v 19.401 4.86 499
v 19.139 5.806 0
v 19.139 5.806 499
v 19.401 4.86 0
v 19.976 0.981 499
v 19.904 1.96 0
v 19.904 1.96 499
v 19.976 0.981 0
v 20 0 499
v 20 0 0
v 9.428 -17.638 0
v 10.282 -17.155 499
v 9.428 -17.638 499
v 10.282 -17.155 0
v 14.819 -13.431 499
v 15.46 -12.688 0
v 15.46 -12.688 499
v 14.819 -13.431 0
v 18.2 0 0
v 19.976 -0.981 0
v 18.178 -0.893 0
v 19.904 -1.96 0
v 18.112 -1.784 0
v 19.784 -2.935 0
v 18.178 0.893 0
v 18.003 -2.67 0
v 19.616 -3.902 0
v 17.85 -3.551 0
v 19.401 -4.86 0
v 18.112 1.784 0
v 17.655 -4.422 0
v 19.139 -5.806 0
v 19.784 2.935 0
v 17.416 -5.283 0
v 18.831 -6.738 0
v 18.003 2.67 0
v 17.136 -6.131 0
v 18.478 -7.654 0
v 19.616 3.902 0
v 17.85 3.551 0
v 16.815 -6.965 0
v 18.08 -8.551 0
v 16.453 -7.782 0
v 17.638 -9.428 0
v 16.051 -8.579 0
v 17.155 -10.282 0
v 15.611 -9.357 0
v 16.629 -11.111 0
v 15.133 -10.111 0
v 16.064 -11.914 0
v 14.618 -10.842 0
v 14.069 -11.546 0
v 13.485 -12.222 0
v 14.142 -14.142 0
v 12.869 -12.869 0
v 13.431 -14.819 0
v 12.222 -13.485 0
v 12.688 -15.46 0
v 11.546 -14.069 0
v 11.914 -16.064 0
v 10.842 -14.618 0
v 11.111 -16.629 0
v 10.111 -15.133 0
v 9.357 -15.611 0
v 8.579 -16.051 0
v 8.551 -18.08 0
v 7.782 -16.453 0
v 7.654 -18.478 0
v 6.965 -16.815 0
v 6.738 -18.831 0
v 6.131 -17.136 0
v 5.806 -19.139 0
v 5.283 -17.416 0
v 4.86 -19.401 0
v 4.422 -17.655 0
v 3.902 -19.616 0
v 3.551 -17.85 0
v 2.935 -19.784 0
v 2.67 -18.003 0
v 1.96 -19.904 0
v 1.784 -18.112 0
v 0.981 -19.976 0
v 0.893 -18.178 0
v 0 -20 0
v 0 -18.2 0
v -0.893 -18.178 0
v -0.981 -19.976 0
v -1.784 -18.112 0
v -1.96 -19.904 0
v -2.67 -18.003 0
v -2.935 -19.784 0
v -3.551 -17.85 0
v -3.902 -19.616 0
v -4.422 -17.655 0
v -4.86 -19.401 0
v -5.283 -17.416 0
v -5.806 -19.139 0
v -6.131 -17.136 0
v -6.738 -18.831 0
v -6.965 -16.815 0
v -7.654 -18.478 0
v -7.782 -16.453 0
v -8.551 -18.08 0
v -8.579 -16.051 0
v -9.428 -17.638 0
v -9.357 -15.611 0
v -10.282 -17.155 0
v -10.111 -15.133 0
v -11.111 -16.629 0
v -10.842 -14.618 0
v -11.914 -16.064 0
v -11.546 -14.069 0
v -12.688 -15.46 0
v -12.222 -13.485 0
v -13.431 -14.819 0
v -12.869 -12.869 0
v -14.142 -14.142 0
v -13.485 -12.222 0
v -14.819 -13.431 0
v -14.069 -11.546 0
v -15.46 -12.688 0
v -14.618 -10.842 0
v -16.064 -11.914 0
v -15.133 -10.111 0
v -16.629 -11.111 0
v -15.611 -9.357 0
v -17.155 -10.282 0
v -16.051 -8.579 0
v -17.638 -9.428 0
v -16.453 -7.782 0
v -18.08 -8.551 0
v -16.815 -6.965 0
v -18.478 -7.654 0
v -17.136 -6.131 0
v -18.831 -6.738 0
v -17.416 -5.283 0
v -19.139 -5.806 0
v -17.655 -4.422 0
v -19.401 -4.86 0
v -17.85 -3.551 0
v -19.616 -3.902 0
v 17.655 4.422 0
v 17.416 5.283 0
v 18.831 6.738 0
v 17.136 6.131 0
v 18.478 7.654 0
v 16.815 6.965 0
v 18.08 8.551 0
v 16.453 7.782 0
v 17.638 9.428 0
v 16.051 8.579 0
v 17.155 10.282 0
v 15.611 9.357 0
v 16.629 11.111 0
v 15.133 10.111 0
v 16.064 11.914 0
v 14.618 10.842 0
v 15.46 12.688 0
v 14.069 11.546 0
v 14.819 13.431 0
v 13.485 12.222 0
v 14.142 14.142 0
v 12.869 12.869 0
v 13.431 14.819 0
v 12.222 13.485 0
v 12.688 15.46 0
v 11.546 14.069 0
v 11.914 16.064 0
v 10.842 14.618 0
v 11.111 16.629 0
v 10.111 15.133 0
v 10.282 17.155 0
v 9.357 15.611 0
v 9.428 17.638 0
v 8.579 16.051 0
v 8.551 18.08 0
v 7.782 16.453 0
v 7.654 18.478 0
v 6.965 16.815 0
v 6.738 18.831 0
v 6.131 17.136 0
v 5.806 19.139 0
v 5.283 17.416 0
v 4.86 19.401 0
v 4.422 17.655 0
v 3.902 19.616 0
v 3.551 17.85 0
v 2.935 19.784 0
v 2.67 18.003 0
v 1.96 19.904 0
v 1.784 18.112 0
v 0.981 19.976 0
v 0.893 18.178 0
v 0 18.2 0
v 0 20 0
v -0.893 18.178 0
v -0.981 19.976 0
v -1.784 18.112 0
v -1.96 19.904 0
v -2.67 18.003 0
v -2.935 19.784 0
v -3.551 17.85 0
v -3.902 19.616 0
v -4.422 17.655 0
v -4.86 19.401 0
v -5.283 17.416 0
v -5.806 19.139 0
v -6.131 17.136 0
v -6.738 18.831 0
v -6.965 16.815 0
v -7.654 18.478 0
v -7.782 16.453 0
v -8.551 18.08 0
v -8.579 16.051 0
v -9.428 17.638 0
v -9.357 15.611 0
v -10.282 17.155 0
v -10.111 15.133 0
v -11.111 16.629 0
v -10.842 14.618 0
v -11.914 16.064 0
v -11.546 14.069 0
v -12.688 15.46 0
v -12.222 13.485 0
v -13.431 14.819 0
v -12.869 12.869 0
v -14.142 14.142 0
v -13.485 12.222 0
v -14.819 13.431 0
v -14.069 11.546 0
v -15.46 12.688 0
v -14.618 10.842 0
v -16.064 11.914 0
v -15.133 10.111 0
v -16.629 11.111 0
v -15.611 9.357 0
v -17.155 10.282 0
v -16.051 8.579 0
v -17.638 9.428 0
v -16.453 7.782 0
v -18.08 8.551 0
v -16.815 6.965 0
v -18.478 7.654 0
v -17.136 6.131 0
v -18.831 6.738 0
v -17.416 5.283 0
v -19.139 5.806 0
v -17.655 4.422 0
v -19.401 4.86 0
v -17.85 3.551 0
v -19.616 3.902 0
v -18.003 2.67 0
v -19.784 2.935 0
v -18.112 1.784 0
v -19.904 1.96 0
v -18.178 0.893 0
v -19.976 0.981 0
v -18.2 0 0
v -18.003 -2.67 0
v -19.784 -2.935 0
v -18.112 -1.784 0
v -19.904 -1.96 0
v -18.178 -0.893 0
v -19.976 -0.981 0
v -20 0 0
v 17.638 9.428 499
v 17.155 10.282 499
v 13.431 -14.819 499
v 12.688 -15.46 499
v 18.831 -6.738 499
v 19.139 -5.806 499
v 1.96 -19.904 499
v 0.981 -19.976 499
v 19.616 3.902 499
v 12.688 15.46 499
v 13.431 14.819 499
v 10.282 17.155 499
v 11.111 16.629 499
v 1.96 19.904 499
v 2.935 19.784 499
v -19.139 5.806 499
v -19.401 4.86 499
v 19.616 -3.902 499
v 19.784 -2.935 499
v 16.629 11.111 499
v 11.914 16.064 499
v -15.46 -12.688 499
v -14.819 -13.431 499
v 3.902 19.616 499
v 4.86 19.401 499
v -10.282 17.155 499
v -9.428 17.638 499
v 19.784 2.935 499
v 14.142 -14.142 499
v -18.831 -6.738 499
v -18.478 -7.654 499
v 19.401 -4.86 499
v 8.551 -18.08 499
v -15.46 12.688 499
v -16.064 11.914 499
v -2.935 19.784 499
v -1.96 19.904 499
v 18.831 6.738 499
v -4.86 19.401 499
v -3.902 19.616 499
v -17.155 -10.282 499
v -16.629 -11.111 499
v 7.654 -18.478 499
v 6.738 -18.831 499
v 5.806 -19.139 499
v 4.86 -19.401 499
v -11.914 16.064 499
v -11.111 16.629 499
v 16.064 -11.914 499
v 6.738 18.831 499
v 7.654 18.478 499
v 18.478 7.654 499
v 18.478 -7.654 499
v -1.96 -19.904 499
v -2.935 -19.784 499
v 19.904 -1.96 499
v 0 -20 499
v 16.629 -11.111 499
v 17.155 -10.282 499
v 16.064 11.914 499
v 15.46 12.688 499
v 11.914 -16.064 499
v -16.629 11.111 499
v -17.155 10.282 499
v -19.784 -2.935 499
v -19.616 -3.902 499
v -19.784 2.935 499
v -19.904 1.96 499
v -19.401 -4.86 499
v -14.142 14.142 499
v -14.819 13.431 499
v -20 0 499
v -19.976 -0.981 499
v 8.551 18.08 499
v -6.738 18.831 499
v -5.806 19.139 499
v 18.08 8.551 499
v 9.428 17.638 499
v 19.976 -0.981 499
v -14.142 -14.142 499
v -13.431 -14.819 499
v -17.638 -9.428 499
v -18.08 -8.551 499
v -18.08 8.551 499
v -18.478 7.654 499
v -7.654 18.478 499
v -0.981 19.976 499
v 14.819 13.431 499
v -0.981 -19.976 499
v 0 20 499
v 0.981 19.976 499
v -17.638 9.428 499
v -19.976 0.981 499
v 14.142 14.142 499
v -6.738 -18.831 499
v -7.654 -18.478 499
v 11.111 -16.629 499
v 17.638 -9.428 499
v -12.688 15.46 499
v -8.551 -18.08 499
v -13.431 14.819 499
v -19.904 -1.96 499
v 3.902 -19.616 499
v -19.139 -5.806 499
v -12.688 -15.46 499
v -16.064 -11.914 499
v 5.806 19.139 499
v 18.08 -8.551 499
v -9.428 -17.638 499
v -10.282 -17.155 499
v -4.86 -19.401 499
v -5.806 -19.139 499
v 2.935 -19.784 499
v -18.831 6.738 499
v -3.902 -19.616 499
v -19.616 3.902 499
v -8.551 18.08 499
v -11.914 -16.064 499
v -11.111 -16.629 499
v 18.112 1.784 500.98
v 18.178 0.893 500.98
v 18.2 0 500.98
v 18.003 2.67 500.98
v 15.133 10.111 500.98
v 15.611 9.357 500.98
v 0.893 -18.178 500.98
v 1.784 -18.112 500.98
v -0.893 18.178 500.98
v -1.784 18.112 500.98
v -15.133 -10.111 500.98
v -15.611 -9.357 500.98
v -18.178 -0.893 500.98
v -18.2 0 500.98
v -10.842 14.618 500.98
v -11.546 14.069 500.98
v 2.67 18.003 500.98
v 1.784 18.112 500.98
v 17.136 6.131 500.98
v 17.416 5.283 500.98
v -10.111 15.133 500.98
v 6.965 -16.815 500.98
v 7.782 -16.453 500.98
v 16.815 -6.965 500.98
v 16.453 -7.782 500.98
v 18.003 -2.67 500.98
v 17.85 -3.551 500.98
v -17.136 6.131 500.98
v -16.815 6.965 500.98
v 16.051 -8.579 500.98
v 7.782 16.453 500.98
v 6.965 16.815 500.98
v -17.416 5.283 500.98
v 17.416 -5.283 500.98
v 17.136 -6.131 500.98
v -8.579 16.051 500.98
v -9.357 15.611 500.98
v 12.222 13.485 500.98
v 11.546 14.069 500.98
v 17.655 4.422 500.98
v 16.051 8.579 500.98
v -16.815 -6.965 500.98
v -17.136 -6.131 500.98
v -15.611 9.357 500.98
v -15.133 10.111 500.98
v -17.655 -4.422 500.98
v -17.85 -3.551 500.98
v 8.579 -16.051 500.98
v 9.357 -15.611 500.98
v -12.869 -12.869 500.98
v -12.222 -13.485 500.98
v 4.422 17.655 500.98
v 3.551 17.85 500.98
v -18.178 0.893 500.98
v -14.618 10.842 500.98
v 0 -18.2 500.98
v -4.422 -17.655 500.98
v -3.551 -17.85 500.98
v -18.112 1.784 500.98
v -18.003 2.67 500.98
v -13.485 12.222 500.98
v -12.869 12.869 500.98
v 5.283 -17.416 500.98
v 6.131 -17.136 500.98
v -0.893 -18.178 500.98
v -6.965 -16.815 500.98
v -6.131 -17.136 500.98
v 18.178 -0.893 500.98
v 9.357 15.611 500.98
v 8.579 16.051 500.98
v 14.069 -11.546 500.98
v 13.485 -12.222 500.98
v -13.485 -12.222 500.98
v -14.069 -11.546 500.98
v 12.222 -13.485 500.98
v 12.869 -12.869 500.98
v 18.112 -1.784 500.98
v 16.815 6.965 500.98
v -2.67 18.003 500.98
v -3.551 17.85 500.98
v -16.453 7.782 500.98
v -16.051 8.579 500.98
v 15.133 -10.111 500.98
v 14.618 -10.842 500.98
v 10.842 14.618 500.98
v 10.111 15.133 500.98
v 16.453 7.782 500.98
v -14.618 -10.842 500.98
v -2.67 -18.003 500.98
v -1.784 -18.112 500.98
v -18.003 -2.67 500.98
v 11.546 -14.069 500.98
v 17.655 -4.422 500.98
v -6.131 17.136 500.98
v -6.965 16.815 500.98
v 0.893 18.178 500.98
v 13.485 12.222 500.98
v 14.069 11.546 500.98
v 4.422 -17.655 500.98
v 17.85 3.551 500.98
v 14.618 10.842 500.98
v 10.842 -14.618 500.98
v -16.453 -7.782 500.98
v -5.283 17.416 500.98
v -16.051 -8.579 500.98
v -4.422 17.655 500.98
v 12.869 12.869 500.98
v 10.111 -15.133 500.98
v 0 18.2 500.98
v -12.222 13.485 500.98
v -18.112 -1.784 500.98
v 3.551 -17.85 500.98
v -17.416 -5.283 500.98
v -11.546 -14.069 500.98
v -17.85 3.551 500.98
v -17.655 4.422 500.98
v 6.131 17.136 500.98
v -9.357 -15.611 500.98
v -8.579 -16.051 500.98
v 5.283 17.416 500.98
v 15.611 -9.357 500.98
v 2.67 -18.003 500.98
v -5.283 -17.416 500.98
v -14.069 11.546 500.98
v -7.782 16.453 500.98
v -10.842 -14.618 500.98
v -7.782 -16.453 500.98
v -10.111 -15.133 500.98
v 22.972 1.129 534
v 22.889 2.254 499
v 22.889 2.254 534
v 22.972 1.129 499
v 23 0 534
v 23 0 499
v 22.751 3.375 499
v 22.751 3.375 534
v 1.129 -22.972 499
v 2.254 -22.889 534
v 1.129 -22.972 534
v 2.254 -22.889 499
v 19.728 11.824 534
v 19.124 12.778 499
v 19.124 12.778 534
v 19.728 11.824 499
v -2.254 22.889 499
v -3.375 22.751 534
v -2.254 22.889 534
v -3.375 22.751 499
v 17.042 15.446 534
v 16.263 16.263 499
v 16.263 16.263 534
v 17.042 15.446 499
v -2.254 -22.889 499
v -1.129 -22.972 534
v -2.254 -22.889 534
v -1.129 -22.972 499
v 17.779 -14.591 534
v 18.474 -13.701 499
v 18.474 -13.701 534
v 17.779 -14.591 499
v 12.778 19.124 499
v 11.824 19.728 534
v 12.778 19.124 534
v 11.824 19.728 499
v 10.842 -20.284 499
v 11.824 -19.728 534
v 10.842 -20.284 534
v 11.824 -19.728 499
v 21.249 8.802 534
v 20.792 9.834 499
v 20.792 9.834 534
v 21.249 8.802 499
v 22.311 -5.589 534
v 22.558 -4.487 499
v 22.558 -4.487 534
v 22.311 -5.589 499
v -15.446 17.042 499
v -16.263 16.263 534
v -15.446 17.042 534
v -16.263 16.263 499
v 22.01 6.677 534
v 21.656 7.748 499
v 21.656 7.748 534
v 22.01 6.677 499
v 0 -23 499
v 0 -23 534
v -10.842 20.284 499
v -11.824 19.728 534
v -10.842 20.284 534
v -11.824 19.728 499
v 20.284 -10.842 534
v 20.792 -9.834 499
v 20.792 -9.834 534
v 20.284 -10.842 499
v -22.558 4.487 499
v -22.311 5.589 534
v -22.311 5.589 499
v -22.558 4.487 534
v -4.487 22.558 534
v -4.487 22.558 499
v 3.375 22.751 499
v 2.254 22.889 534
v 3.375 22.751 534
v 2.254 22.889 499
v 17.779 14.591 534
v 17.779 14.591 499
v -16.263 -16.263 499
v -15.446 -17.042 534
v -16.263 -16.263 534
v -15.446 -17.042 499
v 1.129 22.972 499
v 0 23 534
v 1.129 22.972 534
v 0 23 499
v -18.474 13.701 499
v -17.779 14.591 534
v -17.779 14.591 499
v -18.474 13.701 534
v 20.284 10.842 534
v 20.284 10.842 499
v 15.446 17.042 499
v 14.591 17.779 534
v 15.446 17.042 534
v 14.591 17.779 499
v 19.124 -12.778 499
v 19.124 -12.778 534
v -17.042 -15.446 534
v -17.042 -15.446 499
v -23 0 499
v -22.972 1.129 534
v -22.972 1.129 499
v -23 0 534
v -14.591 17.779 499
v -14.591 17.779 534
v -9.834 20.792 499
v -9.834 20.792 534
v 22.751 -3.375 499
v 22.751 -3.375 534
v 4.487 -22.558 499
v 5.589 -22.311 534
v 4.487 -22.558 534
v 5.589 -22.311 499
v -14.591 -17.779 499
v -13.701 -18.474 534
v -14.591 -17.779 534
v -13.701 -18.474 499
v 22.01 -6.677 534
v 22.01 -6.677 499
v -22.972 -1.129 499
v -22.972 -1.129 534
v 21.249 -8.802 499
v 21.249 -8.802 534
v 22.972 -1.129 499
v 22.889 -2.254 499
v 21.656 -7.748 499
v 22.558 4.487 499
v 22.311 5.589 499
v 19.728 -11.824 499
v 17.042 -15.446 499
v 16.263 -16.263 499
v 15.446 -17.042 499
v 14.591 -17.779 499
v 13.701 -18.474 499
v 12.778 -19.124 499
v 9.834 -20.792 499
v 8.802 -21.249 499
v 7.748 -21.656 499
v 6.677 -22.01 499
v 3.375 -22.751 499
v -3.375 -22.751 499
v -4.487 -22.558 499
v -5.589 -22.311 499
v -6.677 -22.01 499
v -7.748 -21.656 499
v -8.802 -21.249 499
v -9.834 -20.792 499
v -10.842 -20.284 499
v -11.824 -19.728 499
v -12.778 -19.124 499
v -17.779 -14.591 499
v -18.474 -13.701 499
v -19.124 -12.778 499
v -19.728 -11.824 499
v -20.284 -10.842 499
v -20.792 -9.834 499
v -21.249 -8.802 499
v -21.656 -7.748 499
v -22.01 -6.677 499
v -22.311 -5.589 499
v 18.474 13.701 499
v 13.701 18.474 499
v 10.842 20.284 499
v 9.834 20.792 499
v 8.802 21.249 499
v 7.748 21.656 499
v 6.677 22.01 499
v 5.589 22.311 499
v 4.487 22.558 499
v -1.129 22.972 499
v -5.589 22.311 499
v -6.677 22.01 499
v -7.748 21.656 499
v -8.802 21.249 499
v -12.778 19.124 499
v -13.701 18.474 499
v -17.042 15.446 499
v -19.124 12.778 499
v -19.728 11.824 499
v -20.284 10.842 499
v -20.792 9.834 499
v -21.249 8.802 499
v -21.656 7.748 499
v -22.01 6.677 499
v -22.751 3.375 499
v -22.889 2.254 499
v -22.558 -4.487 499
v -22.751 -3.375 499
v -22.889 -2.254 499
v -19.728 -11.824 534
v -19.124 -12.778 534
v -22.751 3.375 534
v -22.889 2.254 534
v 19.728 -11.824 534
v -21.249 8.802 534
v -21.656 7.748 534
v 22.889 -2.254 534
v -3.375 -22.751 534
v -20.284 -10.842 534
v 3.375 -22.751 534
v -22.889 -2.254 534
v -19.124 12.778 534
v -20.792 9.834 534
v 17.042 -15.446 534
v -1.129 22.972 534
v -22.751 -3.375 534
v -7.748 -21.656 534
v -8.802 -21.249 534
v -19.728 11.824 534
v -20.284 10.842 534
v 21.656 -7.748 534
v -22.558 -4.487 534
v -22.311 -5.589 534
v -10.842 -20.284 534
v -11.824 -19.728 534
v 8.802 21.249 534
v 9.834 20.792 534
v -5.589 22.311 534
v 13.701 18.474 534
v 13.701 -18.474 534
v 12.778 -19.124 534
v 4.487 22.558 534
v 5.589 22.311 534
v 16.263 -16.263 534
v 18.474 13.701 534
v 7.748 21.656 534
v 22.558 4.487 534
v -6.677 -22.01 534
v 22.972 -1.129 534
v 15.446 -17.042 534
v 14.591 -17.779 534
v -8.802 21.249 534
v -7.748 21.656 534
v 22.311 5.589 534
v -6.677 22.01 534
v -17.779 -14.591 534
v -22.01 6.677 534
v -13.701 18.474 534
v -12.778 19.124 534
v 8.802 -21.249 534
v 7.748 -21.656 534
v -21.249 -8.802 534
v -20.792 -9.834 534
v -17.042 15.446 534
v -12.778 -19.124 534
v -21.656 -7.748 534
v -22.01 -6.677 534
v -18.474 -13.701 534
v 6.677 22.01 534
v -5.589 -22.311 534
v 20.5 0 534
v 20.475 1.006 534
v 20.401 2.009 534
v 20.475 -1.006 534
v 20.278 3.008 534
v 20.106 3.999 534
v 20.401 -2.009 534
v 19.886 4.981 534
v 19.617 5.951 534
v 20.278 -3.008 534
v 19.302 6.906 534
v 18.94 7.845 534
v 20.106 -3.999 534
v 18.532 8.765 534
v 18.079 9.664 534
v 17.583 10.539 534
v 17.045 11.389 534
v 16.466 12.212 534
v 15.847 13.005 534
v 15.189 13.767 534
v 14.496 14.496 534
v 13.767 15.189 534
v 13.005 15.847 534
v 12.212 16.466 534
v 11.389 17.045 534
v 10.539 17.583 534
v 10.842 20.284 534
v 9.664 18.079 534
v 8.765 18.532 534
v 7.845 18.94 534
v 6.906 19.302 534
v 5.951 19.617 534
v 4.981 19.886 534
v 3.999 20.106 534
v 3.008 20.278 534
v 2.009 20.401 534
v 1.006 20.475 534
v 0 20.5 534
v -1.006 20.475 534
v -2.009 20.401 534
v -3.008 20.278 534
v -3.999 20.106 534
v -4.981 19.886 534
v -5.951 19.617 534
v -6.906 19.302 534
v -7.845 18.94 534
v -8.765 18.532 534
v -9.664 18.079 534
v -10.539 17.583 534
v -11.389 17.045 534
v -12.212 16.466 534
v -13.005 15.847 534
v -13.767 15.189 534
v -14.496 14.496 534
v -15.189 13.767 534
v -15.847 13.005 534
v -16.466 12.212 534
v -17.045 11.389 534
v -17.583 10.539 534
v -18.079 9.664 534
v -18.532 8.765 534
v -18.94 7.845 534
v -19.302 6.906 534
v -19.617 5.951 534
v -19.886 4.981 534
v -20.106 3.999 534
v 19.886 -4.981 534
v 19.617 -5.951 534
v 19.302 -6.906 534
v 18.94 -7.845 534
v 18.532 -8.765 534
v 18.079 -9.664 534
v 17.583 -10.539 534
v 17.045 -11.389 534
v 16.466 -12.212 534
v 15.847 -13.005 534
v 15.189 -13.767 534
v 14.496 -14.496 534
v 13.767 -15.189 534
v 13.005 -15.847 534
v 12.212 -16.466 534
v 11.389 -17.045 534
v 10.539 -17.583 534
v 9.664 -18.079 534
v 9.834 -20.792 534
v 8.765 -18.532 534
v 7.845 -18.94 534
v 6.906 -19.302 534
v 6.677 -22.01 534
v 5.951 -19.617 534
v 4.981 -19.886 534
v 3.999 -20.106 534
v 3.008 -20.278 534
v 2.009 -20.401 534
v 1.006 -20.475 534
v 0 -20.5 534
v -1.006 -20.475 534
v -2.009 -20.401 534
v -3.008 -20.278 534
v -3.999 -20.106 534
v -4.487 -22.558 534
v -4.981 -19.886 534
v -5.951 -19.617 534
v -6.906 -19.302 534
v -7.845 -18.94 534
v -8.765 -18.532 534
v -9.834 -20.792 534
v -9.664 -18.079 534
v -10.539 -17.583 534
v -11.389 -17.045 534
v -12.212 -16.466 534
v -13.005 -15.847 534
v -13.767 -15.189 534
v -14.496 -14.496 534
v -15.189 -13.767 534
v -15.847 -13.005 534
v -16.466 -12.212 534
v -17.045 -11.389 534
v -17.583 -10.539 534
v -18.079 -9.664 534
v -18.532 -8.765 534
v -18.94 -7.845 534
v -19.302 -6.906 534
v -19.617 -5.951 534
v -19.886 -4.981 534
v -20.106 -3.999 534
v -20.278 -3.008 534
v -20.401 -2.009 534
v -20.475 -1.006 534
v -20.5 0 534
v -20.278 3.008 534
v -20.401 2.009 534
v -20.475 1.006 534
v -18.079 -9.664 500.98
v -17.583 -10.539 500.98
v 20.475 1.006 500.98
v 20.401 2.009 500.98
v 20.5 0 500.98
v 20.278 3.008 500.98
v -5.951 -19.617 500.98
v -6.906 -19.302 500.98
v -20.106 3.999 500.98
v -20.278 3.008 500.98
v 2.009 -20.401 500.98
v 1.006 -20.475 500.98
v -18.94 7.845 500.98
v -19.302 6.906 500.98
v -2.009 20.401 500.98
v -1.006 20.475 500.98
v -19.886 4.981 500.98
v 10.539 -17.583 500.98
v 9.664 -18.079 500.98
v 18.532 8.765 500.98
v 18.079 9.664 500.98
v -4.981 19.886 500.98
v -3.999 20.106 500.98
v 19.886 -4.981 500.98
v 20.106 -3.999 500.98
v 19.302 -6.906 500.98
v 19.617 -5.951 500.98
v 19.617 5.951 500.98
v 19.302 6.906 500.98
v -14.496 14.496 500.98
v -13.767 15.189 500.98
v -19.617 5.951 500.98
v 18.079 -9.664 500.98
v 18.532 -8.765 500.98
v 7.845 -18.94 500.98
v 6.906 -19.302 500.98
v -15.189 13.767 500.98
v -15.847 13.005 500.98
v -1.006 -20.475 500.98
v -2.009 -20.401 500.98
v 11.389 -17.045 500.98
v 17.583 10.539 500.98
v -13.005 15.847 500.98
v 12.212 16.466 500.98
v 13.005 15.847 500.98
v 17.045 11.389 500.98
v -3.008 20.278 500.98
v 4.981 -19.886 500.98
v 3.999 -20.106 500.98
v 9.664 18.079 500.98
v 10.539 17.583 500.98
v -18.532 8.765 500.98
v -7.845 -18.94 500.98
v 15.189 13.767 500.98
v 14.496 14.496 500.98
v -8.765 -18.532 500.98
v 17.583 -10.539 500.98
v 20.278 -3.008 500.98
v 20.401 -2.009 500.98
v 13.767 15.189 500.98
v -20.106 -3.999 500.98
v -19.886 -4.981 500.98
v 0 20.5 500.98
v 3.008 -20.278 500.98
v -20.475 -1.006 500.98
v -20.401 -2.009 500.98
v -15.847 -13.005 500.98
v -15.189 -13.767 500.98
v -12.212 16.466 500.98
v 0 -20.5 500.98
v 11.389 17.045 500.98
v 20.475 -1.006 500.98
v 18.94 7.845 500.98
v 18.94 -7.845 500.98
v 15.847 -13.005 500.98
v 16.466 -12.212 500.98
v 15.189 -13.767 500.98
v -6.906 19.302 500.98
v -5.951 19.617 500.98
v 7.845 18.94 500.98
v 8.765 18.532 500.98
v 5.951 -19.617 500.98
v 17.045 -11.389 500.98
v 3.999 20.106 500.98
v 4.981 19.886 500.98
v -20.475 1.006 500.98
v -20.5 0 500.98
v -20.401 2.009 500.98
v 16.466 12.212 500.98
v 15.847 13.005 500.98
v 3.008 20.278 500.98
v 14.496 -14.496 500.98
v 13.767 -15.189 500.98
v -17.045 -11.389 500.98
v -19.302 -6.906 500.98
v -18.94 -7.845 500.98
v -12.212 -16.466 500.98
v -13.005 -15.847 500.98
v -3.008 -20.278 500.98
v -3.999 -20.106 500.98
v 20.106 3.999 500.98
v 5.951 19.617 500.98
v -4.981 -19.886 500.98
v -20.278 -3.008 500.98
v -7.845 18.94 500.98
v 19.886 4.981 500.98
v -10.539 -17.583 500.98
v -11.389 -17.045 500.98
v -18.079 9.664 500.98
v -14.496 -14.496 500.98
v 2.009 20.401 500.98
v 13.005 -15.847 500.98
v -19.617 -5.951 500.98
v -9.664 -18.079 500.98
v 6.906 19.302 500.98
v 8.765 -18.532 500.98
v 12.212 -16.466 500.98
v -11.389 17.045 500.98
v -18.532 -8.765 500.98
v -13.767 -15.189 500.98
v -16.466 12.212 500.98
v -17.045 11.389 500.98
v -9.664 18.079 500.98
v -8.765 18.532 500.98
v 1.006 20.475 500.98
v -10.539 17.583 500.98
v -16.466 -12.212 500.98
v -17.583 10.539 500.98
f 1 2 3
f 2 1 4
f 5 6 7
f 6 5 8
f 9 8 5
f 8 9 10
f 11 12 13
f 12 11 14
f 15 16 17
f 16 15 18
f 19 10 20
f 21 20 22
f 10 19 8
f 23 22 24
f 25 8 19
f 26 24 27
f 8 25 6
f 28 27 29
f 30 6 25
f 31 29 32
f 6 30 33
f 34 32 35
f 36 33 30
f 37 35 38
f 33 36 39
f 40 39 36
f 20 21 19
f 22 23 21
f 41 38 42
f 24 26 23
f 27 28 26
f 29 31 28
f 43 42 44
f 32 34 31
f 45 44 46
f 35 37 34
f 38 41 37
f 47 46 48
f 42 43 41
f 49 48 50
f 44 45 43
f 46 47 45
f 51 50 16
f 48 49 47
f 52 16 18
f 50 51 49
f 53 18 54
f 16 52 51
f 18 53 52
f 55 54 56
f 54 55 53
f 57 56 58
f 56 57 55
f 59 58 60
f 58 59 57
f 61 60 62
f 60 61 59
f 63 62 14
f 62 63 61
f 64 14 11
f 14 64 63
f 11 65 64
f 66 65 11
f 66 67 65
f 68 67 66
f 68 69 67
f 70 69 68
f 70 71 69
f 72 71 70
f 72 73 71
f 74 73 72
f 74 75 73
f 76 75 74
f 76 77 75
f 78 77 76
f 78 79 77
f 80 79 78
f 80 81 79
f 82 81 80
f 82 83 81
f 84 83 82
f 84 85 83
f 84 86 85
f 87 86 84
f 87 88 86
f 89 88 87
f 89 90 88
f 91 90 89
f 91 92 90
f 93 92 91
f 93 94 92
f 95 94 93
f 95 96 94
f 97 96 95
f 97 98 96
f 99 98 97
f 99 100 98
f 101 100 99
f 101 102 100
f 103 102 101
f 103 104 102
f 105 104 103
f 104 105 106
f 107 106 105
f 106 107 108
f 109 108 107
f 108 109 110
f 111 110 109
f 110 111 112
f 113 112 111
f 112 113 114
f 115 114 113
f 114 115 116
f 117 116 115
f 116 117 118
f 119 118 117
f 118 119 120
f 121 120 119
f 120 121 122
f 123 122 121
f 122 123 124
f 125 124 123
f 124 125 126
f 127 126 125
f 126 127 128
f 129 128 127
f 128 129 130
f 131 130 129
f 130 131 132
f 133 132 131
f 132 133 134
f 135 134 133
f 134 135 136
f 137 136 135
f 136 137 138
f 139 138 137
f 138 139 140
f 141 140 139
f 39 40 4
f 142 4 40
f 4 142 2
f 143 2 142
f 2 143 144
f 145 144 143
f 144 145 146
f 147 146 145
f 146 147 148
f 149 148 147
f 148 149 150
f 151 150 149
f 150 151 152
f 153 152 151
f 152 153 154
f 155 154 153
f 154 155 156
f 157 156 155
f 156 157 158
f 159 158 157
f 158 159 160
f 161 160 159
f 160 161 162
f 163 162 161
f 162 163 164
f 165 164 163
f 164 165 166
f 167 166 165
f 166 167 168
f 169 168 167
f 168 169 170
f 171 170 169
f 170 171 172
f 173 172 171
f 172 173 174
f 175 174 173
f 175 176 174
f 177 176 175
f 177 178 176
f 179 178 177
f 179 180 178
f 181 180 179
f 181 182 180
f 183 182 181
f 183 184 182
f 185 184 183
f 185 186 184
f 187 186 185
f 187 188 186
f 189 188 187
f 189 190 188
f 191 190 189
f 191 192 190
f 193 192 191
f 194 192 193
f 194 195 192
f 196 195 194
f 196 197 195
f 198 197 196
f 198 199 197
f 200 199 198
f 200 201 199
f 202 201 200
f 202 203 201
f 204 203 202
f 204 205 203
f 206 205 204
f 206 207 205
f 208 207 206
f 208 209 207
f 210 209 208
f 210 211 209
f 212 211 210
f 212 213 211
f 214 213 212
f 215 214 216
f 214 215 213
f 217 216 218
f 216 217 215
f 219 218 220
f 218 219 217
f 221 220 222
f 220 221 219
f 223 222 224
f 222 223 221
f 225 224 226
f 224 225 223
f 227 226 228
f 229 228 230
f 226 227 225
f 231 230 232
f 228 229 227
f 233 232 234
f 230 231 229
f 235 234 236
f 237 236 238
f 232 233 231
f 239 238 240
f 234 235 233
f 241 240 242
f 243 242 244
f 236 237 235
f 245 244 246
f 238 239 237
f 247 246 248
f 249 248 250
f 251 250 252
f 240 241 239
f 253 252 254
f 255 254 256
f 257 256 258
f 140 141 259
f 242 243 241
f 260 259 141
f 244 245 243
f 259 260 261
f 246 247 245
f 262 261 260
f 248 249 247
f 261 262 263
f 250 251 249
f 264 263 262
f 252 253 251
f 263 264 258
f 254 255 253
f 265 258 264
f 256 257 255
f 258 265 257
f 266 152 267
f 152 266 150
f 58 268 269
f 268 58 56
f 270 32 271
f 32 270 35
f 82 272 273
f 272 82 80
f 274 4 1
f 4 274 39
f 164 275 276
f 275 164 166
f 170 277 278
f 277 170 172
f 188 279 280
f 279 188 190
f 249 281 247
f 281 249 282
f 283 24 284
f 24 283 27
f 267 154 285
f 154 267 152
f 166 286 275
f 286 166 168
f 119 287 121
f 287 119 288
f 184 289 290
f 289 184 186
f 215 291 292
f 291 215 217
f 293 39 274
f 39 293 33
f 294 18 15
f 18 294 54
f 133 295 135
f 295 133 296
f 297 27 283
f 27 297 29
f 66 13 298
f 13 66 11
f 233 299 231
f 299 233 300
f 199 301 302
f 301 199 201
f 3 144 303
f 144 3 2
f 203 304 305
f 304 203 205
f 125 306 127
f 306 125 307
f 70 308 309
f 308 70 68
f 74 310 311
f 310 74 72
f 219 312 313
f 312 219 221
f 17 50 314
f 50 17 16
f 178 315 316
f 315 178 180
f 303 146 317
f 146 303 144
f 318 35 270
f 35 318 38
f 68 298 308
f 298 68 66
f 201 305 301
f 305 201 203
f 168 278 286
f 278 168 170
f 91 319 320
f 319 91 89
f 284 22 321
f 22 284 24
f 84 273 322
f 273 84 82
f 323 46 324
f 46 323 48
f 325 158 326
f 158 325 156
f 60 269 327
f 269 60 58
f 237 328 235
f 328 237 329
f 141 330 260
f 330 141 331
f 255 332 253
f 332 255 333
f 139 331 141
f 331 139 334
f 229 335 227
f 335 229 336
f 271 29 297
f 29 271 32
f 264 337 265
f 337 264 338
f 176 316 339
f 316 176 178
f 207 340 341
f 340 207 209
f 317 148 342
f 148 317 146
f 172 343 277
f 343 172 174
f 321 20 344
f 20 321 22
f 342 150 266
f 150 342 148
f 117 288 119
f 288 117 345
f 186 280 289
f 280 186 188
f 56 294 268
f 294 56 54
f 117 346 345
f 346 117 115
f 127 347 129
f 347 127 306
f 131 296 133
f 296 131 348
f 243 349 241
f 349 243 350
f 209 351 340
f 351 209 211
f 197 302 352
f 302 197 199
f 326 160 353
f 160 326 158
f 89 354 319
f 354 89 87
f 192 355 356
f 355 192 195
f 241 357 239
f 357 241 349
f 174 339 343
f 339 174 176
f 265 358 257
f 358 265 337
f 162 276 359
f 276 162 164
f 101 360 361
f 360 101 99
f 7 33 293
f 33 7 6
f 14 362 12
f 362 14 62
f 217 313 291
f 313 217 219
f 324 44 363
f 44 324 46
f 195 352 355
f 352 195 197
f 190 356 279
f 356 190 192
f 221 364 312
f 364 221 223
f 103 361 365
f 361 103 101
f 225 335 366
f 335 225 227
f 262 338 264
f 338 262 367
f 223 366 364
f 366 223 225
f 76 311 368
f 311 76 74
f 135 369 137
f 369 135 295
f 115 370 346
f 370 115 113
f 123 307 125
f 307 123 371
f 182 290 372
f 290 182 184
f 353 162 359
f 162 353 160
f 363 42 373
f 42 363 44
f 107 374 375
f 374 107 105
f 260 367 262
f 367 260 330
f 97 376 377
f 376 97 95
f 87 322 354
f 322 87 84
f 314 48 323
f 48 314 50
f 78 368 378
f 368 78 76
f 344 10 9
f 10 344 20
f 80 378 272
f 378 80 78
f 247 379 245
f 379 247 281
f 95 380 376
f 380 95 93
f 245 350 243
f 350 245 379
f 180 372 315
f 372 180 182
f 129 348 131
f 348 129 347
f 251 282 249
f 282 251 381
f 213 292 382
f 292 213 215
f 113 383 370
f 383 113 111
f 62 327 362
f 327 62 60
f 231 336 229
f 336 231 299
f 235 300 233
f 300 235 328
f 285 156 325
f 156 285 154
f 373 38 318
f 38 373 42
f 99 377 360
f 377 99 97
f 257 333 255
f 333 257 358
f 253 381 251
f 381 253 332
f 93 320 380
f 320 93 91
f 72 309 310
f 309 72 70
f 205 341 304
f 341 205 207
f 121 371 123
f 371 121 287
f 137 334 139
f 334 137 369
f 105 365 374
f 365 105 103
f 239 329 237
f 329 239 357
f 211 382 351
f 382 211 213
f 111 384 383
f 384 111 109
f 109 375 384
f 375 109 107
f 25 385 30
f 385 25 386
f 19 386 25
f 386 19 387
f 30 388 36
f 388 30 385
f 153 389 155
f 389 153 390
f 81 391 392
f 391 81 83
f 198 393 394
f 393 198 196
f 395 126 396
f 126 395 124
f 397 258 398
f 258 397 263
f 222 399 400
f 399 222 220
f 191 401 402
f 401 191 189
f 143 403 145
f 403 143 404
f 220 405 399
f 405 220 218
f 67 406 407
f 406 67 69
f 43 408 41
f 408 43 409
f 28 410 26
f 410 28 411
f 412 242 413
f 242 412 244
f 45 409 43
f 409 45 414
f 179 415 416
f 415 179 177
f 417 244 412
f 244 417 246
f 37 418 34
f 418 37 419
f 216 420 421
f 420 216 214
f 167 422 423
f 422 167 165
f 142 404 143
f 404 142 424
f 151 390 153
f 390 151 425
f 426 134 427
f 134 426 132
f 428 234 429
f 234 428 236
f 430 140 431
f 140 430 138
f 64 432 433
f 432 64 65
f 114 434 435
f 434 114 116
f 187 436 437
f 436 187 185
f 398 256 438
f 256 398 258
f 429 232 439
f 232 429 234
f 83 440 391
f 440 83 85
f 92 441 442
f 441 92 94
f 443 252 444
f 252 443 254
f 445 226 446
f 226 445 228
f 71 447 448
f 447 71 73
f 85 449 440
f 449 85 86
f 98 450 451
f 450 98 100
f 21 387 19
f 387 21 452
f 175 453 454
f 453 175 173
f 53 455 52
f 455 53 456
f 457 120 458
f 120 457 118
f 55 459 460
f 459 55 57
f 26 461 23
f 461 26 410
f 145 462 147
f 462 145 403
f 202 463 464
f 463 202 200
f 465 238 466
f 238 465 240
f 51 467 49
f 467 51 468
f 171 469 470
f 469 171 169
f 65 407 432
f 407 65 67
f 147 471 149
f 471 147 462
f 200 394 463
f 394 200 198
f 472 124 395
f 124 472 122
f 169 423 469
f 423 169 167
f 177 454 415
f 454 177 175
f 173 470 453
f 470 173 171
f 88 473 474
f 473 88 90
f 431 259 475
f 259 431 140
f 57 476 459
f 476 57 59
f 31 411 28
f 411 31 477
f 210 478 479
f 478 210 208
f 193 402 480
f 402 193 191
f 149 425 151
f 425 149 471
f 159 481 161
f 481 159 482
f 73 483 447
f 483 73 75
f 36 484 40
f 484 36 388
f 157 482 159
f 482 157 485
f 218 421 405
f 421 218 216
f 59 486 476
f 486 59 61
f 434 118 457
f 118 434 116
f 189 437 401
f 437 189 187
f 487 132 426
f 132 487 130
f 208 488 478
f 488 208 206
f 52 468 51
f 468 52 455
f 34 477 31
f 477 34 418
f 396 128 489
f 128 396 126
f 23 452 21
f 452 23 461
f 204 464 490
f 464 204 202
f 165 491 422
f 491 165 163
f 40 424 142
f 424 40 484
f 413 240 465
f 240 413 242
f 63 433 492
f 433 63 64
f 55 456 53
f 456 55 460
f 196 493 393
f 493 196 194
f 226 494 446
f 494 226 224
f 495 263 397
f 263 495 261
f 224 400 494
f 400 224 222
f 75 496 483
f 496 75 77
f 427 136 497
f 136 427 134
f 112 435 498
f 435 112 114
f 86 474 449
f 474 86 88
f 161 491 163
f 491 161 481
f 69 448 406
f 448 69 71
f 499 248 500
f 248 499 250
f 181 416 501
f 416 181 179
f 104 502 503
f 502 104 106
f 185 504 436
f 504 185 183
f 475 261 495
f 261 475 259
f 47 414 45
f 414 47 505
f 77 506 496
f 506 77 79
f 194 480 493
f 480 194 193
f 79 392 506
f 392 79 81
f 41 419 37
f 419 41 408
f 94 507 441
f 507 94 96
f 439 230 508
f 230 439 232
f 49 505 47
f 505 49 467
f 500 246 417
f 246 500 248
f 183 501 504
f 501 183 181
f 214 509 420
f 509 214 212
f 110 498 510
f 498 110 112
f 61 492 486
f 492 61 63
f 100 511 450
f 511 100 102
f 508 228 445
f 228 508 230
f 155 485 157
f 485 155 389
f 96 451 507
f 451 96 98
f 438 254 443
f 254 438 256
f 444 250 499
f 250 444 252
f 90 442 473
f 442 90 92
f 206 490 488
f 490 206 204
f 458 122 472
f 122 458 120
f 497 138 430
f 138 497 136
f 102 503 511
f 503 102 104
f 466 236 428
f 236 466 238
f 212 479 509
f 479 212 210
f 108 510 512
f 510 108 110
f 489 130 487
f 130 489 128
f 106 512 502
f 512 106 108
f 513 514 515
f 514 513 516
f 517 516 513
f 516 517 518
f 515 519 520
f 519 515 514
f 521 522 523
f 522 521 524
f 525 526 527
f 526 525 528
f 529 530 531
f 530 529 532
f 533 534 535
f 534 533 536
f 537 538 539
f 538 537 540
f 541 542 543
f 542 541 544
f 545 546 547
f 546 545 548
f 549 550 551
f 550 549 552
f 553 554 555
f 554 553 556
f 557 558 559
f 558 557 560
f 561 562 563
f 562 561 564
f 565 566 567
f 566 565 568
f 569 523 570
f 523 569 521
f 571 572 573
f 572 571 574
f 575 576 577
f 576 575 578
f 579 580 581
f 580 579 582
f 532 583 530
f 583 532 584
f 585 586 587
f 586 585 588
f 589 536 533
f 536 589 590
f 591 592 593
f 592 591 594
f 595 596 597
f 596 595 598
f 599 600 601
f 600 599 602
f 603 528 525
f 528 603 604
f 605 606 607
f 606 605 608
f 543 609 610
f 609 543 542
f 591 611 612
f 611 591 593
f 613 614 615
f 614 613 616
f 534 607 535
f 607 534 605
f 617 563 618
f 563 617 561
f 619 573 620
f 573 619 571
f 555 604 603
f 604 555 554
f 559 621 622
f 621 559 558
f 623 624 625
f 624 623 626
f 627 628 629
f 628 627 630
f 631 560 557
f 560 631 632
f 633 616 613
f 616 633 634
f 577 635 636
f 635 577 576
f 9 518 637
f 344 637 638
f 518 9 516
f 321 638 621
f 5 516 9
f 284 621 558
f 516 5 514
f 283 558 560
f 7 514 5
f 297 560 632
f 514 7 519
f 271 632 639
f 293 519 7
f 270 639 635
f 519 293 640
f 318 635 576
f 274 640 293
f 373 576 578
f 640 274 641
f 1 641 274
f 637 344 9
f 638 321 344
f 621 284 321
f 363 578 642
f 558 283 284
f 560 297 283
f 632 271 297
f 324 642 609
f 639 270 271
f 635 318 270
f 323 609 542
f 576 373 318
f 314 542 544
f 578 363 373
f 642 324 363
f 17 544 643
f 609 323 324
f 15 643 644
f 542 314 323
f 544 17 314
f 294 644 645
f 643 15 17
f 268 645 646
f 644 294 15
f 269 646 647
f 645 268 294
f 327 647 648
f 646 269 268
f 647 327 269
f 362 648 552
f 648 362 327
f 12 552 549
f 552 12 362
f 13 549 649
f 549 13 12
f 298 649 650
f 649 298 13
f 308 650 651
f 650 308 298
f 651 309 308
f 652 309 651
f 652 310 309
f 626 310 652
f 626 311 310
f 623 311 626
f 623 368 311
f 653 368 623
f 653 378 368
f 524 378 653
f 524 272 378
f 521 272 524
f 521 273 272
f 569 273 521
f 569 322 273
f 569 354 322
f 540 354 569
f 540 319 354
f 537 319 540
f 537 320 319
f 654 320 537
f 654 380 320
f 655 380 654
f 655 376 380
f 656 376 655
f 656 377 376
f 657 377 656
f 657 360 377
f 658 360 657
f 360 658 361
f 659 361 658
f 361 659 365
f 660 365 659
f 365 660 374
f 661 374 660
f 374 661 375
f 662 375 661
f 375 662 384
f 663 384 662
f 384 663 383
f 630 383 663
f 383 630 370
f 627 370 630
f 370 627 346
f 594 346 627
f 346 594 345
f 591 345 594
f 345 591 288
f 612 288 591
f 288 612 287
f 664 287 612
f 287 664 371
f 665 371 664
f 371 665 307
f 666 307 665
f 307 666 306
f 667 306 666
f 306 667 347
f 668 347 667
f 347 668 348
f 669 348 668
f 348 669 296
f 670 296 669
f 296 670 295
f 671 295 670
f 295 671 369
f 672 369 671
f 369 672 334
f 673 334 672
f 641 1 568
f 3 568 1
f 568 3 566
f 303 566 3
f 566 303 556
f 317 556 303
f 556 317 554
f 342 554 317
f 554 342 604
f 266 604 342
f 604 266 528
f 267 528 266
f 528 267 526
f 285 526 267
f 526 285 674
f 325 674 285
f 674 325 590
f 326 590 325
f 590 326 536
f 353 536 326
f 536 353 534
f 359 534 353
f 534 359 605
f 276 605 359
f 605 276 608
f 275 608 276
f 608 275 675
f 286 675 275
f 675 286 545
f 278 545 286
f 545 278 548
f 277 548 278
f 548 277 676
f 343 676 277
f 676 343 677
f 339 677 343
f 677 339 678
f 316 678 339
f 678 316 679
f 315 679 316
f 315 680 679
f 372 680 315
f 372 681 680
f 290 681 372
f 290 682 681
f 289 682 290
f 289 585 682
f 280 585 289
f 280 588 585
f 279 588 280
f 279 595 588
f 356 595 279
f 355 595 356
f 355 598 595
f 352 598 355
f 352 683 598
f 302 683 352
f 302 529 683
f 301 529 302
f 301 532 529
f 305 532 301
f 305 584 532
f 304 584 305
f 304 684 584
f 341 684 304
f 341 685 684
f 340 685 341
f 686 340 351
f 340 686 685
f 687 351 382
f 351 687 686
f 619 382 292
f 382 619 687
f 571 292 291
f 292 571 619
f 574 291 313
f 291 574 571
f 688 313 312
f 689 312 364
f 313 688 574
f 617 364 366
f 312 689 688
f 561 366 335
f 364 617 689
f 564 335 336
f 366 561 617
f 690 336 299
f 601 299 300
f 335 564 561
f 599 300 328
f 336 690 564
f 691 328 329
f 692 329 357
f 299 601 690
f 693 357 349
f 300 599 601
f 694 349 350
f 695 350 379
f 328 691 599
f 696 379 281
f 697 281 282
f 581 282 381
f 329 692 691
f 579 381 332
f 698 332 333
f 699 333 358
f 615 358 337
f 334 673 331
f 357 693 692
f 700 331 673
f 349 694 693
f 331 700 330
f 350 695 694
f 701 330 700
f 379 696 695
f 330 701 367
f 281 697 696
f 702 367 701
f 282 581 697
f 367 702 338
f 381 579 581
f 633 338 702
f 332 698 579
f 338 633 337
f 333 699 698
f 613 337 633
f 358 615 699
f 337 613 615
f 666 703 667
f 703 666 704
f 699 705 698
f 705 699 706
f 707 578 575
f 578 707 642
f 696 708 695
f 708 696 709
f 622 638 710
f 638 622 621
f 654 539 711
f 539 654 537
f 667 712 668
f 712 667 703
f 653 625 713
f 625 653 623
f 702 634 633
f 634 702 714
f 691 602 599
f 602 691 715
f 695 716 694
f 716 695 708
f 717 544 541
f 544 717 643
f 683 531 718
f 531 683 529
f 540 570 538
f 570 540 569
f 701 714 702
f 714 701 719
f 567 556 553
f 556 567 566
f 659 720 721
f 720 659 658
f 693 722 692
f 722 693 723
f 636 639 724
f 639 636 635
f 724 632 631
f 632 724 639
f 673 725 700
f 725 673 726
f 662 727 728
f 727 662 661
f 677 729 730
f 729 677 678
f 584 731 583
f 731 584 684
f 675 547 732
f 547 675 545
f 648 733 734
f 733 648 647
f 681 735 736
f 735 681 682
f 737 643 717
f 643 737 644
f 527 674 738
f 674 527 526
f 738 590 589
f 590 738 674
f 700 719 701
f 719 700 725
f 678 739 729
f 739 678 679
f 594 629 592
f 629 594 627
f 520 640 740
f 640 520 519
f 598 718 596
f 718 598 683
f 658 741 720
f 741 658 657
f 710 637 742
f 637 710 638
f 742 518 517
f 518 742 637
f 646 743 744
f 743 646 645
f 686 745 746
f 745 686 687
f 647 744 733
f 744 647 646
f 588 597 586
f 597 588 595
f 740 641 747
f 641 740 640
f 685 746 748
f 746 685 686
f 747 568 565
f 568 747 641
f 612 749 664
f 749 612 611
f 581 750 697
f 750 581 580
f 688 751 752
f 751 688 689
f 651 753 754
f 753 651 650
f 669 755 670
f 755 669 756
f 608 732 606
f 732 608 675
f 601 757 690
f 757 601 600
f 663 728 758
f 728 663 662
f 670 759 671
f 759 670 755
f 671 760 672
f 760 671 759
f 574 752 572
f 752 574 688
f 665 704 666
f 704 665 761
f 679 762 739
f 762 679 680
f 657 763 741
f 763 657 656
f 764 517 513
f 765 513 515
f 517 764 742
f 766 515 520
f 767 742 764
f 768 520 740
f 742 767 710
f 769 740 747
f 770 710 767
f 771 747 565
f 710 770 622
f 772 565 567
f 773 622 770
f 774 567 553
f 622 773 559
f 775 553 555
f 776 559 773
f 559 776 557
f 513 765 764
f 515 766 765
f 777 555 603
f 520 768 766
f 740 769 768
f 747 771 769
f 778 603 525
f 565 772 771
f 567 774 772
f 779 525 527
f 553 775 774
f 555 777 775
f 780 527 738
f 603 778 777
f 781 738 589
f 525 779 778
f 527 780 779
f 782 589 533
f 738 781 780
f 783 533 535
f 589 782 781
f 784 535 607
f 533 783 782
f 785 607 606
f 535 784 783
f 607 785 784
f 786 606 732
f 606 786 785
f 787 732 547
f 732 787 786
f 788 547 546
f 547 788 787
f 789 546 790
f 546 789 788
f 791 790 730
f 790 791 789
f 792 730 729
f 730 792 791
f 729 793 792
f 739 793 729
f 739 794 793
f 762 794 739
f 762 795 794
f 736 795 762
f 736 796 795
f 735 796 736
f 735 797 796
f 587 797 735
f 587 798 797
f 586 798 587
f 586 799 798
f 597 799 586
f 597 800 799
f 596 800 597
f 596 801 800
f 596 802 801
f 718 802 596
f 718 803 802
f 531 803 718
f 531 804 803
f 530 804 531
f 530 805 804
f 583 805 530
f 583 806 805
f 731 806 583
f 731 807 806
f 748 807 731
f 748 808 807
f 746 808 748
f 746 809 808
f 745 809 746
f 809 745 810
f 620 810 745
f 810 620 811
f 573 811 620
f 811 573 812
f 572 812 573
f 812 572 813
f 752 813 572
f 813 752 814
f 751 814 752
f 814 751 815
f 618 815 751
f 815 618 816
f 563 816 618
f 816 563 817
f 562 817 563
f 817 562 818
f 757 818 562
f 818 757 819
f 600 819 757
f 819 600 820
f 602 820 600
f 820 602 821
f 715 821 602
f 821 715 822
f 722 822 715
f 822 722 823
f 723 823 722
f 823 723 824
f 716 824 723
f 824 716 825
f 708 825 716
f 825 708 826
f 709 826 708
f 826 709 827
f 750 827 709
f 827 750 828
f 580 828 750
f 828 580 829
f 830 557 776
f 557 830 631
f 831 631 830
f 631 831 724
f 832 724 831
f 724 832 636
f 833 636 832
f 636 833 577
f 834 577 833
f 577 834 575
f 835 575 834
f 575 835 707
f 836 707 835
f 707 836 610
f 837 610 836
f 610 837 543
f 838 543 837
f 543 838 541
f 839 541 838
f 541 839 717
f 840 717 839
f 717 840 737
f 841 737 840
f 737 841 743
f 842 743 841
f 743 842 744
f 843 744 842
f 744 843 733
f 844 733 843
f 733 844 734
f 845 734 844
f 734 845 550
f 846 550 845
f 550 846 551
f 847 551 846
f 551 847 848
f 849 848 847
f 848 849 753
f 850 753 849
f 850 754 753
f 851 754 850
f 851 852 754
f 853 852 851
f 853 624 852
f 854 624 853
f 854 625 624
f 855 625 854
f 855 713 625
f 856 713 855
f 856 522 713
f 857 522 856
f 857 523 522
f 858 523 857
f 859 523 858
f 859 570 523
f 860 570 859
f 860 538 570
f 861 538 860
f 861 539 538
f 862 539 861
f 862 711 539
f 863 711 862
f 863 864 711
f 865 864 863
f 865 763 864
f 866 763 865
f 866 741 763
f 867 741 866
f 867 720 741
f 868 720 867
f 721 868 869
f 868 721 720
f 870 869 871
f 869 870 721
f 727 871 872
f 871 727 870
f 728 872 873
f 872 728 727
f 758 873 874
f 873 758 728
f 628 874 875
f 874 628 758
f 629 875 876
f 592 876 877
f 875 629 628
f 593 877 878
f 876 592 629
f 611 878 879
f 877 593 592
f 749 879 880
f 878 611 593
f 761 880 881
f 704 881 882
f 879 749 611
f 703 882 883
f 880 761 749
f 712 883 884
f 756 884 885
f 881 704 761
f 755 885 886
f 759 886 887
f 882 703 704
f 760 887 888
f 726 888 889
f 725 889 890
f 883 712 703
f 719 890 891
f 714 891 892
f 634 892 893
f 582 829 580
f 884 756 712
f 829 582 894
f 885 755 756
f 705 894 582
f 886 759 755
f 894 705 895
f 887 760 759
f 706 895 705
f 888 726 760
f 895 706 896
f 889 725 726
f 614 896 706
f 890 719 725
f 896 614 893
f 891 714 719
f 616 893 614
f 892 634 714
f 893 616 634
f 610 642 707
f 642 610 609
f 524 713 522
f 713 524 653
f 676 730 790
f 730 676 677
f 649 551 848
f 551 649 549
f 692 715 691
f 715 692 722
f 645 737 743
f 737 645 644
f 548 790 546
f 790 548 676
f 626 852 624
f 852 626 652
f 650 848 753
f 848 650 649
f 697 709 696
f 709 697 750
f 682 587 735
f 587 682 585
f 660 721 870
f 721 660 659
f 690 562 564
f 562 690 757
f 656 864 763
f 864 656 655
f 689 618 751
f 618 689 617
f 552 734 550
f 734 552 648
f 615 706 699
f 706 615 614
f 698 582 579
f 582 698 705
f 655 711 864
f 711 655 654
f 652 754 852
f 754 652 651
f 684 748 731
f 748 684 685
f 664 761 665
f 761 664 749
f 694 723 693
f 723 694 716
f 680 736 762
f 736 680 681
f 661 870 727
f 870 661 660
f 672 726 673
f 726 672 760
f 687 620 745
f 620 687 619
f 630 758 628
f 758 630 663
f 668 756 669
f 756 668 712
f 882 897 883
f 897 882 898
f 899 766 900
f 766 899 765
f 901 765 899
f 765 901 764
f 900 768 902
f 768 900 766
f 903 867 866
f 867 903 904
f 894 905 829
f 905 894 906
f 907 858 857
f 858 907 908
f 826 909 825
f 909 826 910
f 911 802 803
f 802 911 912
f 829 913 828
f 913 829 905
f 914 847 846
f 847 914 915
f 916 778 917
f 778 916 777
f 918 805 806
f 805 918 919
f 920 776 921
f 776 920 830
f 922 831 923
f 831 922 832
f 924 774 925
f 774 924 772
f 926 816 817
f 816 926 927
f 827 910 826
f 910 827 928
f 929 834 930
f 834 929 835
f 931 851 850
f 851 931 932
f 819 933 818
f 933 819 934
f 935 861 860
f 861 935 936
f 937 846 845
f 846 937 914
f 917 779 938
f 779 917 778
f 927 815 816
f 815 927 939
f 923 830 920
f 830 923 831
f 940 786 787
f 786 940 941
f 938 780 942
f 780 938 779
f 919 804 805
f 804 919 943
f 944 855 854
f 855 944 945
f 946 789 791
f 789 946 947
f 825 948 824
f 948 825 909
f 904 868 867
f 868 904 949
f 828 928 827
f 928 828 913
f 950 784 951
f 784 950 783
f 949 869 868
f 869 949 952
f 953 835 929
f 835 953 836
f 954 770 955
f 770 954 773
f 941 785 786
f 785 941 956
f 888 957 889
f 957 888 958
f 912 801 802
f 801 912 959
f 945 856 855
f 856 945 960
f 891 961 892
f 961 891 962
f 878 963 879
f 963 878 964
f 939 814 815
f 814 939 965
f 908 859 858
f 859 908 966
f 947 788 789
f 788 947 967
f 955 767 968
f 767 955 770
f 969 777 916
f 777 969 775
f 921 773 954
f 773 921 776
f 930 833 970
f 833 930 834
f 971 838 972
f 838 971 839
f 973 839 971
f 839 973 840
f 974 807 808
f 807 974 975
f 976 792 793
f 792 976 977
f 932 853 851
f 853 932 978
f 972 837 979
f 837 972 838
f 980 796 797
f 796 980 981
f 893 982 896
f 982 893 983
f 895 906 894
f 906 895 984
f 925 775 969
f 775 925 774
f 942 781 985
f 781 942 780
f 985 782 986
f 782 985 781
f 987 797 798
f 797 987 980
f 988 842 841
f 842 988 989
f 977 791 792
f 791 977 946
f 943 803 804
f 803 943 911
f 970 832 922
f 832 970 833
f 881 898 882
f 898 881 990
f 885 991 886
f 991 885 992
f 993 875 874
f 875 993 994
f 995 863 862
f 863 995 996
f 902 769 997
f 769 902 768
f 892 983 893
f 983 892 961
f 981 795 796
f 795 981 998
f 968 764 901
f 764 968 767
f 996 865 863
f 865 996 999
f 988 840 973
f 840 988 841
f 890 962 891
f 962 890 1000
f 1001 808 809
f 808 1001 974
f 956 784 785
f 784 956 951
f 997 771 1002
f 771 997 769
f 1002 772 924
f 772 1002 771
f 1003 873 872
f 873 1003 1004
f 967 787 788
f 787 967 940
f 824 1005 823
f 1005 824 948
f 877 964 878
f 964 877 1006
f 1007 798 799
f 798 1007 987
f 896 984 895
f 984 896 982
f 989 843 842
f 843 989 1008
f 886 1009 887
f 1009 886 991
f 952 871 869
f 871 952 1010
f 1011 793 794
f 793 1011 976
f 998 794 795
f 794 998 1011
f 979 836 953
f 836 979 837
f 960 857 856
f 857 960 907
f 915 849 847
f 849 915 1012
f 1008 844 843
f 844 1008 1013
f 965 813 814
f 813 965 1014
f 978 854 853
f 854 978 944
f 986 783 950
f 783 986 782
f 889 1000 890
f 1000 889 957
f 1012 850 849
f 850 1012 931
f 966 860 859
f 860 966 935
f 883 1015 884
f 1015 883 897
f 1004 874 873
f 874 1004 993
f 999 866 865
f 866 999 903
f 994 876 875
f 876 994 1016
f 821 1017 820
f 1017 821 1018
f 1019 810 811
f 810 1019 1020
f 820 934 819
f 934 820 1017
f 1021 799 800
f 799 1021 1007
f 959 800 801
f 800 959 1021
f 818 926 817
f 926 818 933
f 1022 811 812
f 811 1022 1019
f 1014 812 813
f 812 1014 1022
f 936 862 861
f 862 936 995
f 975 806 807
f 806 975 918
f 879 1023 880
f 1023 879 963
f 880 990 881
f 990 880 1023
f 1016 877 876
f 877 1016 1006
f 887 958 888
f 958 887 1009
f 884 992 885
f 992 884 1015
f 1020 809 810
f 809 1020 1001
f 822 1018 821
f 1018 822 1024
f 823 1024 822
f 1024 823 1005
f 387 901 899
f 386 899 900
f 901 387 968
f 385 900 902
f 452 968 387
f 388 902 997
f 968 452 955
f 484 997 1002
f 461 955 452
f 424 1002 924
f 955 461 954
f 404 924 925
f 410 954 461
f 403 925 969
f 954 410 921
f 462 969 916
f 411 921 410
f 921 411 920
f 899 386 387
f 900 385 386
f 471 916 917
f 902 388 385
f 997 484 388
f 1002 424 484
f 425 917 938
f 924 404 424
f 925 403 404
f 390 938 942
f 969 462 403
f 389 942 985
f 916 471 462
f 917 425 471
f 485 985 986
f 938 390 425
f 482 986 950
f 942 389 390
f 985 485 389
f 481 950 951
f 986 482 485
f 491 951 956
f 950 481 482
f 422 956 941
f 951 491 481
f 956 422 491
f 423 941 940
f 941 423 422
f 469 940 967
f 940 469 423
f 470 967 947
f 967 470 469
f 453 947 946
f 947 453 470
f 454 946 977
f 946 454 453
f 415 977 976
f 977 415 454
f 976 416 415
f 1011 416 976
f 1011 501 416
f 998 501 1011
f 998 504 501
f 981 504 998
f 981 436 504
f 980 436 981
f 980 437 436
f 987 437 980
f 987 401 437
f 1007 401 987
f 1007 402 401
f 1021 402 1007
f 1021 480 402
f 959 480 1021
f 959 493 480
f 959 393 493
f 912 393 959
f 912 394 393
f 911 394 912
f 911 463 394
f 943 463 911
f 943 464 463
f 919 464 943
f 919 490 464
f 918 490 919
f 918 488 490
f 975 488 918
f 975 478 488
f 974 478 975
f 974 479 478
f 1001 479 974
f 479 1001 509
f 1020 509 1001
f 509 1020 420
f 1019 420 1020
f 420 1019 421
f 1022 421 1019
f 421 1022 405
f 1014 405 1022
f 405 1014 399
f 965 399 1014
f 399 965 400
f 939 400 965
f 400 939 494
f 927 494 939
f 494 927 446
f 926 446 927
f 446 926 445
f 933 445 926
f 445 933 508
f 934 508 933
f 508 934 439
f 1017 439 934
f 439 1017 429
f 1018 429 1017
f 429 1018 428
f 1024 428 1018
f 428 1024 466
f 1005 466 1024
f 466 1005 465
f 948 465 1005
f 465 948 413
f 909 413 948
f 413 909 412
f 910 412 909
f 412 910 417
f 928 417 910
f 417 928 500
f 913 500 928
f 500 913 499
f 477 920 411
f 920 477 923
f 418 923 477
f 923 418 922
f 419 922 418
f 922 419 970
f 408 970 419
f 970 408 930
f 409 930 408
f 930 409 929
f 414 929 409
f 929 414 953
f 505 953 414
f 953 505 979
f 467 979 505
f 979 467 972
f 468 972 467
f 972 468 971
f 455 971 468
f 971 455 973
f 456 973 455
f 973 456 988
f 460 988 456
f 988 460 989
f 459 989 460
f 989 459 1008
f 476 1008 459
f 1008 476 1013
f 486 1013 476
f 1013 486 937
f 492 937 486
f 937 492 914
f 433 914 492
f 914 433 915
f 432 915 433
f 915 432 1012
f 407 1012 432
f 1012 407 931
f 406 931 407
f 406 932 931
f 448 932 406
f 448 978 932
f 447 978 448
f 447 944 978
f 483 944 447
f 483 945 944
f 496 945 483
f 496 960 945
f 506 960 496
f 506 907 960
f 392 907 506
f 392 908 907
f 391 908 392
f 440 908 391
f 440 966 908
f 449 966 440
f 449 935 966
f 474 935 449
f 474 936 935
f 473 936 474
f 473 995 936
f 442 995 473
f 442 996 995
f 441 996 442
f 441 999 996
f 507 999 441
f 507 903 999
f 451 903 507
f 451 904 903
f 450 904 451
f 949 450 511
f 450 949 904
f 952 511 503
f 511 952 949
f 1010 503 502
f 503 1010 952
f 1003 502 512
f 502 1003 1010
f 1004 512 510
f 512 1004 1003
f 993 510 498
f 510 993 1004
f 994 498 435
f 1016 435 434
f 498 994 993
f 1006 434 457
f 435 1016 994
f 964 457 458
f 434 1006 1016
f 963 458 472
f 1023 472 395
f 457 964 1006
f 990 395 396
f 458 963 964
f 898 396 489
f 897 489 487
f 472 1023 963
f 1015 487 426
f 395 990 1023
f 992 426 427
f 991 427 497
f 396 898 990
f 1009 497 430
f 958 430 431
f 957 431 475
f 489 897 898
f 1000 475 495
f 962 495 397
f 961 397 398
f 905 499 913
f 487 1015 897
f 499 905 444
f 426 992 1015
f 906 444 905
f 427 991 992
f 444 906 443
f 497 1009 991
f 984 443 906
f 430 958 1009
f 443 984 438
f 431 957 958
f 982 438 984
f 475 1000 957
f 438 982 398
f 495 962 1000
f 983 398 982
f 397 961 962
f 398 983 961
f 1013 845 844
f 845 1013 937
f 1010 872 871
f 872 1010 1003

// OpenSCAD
// Parameters
length_mm = 500; //[250:1000:1]
ht40_outer_diameter = 40; //[20:80:0.5]
ht40_wall_thickness = 1.8; //[0.9:3.6:0.1]
fitting_outer_diameter = 46; //[35:70:0.5]
fitting_height = 35; //[15:70:1]
fitting_wall_thickness = 2.5; //[1.2:5:0.1]
fitting_stop_thickness = 2; //[1:6:0.5]
overlap_mm = 1; //[0.5:2:0.1]

$fn = 128;

// HT Pipe Segment - One connected solid
module ht_pipe() {
    // Derived radii
    ro_pipe = ht40_outer_diameter/2;
    ri_pipe = ro_pipe - ht40_wall_thickness;

    ro_fit  = fitting_outer_diameter/2;
    ri_fit  = ro_fit - fitting_wall_thickness;

    // Safety clamps to avoid invalid/empty geometry
    ri_pipe_s = max(0.01, ri_pipe);
    ri_fit_s  = max(0.01, ri_fit);

    // Ensure inner subtraction is longer than outer to avoid coplanar faces
    eps = 0.02;

    color([0.85, 0.85, 0.8])  // PVC color
    union() {
        // Main pipe (hollow)
        difference() {
            cylinder(h=length_mm, r=ro_pipe, center=false);
            translate([0, 0, -eps])
                cylinder(h=length_mm + 2*eps, r=ri_pipe_s, center=false);
        }

        // Socket/fitting at the end, connected with controlled overlap
        // Place fitting so it overlaps the pipe by overlap_mm
        translate([0, 0, length_mm - overlap_mm]) {
            difference() {
                // Outer fitting body
                cylinder(h=fitting_height, r=ro_fit, center=false);

                // Inner cavity of fitting (starts after stop thickness)
                translate([0, 0, fitting_stop_thickness - eps])
                    cylinder(h=fitting_height - fitting_stop_thickness + 2*eps, r=ri_fit_s, center=false);

                // Clear the pipe bore through the fitting so the pipe remains hollow
                translate([0, 0, -eps])
                    cylinder(h=fitting_height + 2*eps, r=ri_pipe_s, center=false);
            }
        }
    }
}

ht_pipe();
